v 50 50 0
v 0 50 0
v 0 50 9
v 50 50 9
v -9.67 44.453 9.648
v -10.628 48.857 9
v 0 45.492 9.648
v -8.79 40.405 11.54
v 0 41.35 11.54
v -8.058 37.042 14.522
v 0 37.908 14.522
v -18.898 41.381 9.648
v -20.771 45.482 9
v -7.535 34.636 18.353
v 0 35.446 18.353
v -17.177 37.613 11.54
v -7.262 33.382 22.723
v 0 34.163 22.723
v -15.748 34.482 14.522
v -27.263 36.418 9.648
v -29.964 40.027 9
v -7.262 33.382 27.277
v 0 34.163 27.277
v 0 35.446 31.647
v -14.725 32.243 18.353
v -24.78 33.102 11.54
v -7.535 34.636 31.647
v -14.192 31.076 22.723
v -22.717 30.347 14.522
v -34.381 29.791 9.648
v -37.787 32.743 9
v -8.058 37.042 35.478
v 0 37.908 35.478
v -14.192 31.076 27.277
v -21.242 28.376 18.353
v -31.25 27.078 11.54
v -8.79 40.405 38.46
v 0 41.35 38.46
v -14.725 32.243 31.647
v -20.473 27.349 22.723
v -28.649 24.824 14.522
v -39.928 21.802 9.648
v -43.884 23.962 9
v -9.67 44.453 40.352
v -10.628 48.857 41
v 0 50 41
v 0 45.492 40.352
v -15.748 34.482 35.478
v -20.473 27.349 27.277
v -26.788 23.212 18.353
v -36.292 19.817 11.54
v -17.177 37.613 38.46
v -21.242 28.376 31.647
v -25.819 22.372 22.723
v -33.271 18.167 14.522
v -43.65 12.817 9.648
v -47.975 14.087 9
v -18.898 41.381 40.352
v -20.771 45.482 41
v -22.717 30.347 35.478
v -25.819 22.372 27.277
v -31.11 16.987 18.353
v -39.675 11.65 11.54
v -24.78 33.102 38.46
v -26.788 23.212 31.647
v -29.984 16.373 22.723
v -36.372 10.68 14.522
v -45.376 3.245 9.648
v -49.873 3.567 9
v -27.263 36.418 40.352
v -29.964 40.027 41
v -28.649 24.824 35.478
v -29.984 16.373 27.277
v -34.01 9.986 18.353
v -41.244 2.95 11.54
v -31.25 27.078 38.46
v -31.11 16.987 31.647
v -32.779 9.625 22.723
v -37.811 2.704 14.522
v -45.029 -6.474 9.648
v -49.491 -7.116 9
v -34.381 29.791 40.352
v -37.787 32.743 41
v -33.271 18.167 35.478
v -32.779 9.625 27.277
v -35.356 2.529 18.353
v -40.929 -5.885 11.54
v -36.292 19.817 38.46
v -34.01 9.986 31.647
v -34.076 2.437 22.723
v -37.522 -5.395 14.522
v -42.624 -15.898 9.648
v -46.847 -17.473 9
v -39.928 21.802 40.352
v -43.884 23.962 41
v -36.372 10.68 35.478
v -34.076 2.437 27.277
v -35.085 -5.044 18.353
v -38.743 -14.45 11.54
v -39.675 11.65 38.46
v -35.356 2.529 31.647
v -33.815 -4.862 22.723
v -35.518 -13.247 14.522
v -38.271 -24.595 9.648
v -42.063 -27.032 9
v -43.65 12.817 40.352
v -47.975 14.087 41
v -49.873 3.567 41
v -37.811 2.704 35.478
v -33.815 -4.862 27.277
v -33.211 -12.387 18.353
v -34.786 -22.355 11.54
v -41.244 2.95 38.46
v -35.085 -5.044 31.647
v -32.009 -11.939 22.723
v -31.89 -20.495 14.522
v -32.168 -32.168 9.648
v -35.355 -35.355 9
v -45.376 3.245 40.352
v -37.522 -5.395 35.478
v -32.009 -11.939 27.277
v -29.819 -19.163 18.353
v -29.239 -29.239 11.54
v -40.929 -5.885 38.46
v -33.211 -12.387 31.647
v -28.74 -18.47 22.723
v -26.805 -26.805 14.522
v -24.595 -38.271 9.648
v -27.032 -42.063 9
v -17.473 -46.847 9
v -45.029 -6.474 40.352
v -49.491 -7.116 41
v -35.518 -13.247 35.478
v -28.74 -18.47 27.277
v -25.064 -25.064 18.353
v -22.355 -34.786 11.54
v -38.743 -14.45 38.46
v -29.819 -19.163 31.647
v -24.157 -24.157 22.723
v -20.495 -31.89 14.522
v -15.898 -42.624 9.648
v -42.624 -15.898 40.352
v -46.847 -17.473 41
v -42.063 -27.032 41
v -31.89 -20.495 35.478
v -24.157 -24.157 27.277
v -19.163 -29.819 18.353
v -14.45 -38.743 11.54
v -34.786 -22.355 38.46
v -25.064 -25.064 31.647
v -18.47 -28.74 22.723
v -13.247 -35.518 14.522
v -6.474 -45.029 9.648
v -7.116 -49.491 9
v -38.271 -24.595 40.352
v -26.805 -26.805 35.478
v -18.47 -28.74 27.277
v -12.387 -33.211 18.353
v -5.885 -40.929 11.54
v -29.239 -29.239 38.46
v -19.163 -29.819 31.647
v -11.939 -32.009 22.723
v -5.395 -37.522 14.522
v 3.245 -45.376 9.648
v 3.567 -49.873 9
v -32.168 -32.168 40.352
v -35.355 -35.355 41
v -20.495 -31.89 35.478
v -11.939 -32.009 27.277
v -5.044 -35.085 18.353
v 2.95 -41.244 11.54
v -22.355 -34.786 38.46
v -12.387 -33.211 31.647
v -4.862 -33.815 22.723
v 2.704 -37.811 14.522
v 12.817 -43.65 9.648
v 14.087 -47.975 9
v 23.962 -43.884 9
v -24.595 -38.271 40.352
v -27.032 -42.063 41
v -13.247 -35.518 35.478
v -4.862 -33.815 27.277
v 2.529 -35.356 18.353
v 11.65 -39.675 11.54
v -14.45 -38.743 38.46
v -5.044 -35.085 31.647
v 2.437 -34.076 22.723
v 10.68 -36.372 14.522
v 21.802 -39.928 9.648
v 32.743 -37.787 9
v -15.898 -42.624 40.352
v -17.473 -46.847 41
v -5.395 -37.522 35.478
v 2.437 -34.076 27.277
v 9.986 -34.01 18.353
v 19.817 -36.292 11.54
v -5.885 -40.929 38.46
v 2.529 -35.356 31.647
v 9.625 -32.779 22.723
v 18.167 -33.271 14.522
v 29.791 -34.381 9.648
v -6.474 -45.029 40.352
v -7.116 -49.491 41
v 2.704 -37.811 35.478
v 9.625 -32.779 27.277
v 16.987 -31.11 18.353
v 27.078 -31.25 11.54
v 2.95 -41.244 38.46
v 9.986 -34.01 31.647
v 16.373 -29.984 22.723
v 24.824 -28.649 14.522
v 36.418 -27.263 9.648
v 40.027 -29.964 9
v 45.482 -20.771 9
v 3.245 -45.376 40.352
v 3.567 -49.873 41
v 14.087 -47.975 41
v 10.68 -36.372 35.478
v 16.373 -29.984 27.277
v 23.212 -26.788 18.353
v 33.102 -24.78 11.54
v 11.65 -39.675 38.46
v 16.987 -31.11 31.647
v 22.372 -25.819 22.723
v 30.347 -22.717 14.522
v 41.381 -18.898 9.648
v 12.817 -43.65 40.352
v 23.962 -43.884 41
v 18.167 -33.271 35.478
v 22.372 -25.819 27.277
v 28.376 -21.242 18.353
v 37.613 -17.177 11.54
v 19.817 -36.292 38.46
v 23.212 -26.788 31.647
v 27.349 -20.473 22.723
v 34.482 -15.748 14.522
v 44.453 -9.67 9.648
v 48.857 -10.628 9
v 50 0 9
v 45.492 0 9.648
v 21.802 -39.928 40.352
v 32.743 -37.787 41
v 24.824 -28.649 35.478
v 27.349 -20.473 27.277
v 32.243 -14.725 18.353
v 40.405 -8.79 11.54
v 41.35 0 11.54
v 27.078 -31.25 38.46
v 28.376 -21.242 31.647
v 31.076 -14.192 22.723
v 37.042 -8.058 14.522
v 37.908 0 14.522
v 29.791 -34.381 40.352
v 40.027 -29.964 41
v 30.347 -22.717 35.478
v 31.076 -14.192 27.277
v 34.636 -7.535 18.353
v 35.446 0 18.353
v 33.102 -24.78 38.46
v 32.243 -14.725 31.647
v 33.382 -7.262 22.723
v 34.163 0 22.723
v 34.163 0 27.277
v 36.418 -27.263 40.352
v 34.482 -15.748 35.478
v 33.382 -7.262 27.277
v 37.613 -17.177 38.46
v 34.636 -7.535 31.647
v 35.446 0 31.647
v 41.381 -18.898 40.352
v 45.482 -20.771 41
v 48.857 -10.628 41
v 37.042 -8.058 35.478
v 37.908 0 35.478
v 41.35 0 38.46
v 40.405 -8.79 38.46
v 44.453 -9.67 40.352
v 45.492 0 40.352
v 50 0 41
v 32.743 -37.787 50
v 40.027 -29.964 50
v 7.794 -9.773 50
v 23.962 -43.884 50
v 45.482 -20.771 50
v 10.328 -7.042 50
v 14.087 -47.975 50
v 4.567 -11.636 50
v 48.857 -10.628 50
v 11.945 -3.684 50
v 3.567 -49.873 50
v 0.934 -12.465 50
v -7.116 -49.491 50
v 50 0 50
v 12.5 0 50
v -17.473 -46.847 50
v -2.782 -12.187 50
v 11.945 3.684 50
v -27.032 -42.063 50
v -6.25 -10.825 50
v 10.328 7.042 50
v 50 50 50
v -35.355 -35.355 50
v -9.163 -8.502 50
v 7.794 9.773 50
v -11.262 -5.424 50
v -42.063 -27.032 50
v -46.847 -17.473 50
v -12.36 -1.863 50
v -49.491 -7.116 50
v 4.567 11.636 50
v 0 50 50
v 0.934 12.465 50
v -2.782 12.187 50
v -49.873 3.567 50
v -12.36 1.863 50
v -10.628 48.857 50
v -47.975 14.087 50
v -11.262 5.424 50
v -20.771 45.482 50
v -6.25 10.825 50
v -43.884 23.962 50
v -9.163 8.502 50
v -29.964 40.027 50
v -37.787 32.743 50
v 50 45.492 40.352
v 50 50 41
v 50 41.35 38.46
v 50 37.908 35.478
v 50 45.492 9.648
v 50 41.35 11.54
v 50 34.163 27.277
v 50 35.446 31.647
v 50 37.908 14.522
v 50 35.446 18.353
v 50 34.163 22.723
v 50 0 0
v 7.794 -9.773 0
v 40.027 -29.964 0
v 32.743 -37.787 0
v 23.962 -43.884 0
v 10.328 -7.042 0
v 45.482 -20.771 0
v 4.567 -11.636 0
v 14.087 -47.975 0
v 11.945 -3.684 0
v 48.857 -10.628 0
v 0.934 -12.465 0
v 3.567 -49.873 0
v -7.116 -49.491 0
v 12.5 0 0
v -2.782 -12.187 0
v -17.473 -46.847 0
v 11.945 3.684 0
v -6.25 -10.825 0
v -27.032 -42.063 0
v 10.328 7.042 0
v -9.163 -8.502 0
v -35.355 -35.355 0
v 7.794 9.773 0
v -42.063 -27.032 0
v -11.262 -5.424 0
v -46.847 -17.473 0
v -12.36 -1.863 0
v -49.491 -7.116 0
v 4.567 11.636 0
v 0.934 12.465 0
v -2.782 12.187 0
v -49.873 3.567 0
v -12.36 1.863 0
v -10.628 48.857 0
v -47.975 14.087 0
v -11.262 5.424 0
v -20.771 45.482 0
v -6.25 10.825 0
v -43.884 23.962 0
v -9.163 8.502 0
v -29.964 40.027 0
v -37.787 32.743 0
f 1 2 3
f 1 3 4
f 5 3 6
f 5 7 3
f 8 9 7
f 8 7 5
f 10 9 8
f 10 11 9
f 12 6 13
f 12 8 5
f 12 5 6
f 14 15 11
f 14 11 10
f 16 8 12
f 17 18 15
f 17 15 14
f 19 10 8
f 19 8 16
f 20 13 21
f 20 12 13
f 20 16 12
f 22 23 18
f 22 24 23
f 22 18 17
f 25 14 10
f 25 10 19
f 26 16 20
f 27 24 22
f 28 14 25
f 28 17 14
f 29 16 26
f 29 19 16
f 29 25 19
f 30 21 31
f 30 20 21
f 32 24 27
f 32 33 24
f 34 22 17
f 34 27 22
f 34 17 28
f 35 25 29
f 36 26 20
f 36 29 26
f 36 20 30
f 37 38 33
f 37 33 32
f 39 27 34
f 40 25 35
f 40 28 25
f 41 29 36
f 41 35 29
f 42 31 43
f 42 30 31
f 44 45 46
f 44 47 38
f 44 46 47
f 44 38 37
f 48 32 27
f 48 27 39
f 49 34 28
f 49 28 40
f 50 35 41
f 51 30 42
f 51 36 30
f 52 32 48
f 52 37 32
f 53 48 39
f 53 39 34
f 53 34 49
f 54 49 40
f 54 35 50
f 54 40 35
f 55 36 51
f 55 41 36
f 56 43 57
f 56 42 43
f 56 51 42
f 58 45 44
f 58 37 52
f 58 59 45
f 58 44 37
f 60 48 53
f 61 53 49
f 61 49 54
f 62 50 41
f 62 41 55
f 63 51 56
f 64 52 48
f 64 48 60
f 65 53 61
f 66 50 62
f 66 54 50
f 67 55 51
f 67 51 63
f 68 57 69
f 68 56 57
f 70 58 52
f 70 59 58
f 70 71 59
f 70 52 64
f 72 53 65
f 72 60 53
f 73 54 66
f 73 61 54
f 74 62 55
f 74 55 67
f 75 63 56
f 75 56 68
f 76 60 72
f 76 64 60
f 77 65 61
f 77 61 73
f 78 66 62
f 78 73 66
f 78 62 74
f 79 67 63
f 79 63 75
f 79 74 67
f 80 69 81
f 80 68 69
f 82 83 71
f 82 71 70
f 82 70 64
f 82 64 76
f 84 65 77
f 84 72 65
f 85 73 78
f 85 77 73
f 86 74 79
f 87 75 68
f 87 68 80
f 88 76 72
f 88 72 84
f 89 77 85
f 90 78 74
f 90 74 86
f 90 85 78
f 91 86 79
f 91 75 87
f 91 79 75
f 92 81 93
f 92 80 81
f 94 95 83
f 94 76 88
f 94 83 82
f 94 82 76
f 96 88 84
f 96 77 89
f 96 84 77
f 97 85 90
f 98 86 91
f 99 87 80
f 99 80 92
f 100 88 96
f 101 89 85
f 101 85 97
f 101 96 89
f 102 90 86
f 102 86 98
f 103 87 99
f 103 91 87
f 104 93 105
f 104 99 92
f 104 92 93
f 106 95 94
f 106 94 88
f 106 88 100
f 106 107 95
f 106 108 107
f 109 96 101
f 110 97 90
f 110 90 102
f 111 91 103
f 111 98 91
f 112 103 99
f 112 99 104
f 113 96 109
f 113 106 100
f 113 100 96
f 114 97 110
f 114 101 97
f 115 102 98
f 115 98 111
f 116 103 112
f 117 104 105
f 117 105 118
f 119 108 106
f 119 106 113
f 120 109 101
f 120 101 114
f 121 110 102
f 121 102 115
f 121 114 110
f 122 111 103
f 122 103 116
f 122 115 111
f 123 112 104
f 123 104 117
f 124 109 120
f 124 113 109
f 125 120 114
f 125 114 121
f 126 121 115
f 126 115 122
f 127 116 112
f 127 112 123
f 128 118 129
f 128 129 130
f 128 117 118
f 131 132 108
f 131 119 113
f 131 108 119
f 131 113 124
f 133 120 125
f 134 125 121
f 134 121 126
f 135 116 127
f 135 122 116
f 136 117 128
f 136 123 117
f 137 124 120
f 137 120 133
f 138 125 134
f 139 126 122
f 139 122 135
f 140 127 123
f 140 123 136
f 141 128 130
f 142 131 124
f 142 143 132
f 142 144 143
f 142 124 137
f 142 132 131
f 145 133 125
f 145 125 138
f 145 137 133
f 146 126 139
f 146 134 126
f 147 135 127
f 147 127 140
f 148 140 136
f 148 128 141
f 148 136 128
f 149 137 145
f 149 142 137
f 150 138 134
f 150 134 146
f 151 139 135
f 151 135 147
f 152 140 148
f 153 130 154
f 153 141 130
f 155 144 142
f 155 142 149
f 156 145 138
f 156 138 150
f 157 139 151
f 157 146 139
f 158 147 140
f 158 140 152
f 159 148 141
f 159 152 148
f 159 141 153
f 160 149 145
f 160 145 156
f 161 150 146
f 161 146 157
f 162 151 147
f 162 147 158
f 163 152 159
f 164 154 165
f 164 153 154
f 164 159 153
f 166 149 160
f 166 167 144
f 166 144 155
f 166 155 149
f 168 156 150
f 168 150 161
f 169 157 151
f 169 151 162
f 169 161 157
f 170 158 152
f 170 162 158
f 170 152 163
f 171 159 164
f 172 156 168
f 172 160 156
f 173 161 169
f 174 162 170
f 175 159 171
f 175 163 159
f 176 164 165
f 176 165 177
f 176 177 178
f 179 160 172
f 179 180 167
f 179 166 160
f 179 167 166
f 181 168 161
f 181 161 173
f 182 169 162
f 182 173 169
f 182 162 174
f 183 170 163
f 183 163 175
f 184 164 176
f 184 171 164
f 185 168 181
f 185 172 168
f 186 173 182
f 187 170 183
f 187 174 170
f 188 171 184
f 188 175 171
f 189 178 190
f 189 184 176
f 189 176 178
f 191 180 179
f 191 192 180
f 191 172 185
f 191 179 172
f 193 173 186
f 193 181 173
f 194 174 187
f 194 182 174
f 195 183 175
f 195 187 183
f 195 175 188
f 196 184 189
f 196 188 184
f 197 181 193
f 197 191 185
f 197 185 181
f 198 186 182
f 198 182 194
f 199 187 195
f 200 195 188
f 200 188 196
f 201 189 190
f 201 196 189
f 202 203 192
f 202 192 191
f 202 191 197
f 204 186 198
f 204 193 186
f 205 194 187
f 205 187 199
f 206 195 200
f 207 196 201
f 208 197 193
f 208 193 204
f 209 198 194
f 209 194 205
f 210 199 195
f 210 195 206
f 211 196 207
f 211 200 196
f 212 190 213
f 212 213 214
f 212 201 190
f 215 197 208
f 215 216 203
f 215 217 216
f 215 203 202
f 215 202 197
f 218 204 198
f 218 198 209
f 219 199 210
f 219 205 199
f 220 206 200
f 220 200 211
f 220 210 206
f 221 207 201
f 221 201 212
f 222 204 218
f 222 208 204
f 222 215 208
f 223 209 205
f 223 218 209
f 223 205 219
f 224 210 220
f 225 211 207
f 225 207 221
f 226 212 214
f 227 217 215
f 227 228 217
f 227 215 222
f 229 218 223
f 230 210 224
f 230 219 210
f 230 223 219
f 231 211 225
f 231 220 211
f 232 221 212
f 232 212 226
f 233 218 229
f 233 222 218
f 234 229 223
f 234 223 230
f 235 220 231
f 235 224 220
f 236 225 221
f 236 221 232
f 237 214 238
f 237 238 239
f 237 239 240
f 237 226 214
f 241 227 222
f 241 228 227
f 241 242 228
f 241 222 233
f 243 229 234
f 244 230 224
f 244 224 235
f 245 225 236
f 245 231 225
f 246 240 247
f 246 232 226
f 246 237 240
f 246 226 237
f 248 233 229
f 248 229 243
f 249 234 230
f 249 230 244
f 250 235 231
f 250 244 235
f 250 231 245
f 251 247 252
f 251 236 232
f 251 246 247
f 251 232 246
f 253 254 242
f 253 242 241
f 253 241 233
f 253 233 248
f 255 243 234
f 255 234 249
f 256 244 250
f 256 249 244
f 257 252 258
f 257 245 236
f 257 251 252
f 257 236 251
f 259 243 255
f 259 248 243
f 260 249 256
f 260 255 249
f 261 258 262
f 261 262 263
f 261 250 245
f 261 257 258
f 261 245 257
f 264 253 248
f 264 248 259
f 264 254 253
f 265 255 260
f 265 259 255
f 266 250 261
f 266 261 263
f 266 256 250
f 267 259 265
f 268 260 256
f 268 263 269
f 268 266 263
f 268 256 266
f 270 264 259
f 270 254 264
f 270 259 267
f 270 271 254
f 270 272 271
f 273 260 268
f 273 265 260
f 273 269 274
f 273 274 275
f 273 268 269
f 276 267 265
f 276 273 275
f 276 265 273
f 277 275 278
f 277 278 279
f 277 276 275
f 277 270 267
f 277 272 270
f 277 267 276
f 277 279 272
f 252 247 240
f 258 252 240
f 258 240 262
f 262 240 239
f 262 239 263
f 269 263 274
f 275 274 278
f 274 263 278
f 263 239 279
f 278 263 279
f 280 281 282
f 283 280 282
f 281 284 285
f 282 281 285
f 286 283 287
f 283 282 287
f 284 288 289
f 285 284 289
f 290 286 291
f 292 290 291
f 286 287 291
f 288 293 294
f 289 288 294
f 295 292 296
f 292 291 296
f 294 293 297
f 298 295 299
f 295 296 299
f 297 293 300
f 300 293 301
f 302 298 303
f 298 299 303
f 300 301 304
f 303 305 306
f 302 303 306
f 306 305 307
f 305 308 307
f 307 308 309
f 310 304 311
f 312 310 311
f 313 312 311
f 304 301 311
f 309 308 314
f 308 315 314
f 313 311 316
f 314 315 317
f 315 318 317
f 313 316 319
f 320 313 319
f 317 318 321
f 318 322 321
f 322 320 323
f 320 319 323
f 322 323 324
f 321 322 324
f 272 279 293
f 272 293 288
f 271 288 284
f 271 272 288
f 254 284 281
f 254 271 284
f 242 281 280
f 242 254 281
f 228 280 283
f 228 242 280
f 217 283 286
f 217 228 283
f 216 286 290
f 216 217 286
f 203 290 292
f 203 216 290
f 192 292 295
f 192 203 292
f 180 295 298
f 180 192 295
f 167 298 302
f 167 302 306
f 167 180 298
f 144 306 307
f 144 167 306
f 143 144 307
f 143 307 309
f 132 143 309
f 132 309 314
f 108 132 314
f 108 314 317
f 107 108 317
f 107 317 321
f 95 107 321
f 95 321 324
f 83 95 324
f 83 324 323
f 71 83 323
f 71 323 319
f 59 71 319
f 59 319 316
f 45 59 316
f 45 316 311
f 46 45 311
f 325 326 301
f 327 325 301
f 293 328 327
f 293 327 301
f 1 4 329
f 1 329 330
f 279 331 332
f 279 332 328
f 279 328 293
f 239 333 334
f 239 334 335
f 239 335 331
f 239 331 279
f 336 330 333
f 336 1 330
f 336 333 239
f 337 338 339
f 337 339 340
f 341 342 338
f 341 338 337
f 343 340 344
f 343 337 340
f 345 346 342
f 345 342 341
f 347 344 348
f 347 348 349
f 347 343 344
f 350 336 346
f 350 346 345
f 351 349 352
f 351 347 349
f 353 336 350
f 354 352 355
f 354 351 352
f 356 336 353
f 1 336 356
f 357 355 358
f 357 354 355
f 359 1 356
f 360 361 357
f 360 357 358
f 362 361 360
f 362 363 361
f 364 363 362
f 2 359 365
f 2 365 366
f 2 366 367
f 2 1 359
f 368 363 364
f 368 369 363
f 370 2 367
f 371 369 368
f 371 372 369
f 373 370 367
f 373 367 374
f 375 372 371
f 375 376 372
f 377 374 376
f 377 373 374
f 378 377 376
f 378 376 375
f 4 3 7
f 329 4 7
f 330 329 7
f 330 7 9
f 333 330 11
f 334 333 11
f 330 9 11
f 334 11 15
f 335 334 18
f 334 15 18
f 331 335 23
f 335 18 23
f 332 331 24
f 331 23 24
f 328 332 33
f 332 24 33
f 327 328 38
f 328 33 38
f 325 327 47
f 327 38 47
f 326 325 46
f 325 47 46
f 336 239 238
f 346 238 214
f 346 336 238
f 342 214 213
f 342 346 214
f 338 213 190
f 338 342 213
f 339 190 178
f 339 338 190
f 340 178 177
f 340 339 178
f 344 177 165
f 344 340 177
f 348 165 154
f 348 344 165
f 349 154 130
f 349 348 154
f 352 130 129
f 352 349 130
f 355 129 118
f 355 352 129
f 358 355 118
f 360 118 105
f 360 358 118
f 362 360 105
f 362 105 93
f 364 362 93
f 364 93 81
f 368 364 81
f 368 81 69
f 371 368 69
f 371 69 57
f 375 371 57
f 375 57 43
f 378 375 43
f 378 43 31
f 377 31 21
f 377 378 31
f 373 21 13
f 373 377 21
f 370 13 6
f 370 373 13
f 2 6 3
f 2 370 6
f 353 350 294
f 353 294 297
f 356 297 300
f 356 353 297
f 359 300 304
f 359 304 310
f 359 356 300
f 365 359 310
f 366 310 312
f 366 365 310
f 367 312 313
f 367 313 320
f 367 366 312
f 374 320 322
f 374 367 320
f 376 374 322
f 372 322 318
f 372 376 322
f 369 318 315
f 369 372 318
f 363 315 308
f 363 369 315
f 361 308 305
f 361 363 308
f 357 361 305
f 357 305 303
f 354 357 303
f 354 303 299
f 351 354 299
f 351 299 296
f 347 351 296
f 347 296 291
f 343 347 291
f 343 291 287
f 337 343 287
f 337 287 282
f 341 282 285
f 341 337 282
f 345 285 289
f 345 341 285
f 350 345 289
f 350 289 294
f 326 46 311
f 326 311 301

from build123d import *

# Parameters (mm, degrees)
SKETCH1_R           = 12.5
BOSS_EXTRUDE2_DEPTH = 50
CUT_REVOLVE1_ANGLE  = 270
CUT_EXTRUDE1_DEPTH  = 50


with BuildPart() as part:
    # Sketch1 → Boss-Extrude2 (new body)
    with BuildSketch(Plane.XY):
        with BuildLine():
            Line((0, 50), (50, 50))
            Line((50, 50), (50, 0))
            ThreePointArc((50, 0), (-35.355339059, -35.355339059), (0, 50))
        make_face()
        Circle(SKETCH1_R, mode=Mode.SUBTRACT)
    extrude(amount=BOSS_EXTRUDE2_DEPTH)

    # Sketch2 → Cut-Revolve1 (revolve, cut)
    with BuildSketch(Plane(origin=(0, 0, 0), x_dir=(0, 0, -1), z_dir=(1, 0, 0))):
        with BuildLine():
            Line((-41, 50), (-9, 50))
            ThreePointArc((-9, 50), (-25, 34), (-41, 50))
        make_face()
    revolve(axis=Axis((0, 0, 0), (0, 0, 1)), revolution_arc=CUT_REVOLVE1_ANGLE, mode=Mode.SUBTRACT)

    # Sketch2<2> → Cut-Extrude1 (cut)
    with BuildSketch(Plane(origin=(0, 0, 0), x_dir=(0, 0, -1), z_dir=(1, 0, 0))):
        with BuildLine():
            Line((-41, 50), (-9, 50))
            ThreePointArc((-9, 50), (-25, 34), (-41, 50))
        make_face()
    extrude(amount=CUT_EXTRUDE1_DEPTH, mode=Mode.SUBTRACT)


solid = part.part
